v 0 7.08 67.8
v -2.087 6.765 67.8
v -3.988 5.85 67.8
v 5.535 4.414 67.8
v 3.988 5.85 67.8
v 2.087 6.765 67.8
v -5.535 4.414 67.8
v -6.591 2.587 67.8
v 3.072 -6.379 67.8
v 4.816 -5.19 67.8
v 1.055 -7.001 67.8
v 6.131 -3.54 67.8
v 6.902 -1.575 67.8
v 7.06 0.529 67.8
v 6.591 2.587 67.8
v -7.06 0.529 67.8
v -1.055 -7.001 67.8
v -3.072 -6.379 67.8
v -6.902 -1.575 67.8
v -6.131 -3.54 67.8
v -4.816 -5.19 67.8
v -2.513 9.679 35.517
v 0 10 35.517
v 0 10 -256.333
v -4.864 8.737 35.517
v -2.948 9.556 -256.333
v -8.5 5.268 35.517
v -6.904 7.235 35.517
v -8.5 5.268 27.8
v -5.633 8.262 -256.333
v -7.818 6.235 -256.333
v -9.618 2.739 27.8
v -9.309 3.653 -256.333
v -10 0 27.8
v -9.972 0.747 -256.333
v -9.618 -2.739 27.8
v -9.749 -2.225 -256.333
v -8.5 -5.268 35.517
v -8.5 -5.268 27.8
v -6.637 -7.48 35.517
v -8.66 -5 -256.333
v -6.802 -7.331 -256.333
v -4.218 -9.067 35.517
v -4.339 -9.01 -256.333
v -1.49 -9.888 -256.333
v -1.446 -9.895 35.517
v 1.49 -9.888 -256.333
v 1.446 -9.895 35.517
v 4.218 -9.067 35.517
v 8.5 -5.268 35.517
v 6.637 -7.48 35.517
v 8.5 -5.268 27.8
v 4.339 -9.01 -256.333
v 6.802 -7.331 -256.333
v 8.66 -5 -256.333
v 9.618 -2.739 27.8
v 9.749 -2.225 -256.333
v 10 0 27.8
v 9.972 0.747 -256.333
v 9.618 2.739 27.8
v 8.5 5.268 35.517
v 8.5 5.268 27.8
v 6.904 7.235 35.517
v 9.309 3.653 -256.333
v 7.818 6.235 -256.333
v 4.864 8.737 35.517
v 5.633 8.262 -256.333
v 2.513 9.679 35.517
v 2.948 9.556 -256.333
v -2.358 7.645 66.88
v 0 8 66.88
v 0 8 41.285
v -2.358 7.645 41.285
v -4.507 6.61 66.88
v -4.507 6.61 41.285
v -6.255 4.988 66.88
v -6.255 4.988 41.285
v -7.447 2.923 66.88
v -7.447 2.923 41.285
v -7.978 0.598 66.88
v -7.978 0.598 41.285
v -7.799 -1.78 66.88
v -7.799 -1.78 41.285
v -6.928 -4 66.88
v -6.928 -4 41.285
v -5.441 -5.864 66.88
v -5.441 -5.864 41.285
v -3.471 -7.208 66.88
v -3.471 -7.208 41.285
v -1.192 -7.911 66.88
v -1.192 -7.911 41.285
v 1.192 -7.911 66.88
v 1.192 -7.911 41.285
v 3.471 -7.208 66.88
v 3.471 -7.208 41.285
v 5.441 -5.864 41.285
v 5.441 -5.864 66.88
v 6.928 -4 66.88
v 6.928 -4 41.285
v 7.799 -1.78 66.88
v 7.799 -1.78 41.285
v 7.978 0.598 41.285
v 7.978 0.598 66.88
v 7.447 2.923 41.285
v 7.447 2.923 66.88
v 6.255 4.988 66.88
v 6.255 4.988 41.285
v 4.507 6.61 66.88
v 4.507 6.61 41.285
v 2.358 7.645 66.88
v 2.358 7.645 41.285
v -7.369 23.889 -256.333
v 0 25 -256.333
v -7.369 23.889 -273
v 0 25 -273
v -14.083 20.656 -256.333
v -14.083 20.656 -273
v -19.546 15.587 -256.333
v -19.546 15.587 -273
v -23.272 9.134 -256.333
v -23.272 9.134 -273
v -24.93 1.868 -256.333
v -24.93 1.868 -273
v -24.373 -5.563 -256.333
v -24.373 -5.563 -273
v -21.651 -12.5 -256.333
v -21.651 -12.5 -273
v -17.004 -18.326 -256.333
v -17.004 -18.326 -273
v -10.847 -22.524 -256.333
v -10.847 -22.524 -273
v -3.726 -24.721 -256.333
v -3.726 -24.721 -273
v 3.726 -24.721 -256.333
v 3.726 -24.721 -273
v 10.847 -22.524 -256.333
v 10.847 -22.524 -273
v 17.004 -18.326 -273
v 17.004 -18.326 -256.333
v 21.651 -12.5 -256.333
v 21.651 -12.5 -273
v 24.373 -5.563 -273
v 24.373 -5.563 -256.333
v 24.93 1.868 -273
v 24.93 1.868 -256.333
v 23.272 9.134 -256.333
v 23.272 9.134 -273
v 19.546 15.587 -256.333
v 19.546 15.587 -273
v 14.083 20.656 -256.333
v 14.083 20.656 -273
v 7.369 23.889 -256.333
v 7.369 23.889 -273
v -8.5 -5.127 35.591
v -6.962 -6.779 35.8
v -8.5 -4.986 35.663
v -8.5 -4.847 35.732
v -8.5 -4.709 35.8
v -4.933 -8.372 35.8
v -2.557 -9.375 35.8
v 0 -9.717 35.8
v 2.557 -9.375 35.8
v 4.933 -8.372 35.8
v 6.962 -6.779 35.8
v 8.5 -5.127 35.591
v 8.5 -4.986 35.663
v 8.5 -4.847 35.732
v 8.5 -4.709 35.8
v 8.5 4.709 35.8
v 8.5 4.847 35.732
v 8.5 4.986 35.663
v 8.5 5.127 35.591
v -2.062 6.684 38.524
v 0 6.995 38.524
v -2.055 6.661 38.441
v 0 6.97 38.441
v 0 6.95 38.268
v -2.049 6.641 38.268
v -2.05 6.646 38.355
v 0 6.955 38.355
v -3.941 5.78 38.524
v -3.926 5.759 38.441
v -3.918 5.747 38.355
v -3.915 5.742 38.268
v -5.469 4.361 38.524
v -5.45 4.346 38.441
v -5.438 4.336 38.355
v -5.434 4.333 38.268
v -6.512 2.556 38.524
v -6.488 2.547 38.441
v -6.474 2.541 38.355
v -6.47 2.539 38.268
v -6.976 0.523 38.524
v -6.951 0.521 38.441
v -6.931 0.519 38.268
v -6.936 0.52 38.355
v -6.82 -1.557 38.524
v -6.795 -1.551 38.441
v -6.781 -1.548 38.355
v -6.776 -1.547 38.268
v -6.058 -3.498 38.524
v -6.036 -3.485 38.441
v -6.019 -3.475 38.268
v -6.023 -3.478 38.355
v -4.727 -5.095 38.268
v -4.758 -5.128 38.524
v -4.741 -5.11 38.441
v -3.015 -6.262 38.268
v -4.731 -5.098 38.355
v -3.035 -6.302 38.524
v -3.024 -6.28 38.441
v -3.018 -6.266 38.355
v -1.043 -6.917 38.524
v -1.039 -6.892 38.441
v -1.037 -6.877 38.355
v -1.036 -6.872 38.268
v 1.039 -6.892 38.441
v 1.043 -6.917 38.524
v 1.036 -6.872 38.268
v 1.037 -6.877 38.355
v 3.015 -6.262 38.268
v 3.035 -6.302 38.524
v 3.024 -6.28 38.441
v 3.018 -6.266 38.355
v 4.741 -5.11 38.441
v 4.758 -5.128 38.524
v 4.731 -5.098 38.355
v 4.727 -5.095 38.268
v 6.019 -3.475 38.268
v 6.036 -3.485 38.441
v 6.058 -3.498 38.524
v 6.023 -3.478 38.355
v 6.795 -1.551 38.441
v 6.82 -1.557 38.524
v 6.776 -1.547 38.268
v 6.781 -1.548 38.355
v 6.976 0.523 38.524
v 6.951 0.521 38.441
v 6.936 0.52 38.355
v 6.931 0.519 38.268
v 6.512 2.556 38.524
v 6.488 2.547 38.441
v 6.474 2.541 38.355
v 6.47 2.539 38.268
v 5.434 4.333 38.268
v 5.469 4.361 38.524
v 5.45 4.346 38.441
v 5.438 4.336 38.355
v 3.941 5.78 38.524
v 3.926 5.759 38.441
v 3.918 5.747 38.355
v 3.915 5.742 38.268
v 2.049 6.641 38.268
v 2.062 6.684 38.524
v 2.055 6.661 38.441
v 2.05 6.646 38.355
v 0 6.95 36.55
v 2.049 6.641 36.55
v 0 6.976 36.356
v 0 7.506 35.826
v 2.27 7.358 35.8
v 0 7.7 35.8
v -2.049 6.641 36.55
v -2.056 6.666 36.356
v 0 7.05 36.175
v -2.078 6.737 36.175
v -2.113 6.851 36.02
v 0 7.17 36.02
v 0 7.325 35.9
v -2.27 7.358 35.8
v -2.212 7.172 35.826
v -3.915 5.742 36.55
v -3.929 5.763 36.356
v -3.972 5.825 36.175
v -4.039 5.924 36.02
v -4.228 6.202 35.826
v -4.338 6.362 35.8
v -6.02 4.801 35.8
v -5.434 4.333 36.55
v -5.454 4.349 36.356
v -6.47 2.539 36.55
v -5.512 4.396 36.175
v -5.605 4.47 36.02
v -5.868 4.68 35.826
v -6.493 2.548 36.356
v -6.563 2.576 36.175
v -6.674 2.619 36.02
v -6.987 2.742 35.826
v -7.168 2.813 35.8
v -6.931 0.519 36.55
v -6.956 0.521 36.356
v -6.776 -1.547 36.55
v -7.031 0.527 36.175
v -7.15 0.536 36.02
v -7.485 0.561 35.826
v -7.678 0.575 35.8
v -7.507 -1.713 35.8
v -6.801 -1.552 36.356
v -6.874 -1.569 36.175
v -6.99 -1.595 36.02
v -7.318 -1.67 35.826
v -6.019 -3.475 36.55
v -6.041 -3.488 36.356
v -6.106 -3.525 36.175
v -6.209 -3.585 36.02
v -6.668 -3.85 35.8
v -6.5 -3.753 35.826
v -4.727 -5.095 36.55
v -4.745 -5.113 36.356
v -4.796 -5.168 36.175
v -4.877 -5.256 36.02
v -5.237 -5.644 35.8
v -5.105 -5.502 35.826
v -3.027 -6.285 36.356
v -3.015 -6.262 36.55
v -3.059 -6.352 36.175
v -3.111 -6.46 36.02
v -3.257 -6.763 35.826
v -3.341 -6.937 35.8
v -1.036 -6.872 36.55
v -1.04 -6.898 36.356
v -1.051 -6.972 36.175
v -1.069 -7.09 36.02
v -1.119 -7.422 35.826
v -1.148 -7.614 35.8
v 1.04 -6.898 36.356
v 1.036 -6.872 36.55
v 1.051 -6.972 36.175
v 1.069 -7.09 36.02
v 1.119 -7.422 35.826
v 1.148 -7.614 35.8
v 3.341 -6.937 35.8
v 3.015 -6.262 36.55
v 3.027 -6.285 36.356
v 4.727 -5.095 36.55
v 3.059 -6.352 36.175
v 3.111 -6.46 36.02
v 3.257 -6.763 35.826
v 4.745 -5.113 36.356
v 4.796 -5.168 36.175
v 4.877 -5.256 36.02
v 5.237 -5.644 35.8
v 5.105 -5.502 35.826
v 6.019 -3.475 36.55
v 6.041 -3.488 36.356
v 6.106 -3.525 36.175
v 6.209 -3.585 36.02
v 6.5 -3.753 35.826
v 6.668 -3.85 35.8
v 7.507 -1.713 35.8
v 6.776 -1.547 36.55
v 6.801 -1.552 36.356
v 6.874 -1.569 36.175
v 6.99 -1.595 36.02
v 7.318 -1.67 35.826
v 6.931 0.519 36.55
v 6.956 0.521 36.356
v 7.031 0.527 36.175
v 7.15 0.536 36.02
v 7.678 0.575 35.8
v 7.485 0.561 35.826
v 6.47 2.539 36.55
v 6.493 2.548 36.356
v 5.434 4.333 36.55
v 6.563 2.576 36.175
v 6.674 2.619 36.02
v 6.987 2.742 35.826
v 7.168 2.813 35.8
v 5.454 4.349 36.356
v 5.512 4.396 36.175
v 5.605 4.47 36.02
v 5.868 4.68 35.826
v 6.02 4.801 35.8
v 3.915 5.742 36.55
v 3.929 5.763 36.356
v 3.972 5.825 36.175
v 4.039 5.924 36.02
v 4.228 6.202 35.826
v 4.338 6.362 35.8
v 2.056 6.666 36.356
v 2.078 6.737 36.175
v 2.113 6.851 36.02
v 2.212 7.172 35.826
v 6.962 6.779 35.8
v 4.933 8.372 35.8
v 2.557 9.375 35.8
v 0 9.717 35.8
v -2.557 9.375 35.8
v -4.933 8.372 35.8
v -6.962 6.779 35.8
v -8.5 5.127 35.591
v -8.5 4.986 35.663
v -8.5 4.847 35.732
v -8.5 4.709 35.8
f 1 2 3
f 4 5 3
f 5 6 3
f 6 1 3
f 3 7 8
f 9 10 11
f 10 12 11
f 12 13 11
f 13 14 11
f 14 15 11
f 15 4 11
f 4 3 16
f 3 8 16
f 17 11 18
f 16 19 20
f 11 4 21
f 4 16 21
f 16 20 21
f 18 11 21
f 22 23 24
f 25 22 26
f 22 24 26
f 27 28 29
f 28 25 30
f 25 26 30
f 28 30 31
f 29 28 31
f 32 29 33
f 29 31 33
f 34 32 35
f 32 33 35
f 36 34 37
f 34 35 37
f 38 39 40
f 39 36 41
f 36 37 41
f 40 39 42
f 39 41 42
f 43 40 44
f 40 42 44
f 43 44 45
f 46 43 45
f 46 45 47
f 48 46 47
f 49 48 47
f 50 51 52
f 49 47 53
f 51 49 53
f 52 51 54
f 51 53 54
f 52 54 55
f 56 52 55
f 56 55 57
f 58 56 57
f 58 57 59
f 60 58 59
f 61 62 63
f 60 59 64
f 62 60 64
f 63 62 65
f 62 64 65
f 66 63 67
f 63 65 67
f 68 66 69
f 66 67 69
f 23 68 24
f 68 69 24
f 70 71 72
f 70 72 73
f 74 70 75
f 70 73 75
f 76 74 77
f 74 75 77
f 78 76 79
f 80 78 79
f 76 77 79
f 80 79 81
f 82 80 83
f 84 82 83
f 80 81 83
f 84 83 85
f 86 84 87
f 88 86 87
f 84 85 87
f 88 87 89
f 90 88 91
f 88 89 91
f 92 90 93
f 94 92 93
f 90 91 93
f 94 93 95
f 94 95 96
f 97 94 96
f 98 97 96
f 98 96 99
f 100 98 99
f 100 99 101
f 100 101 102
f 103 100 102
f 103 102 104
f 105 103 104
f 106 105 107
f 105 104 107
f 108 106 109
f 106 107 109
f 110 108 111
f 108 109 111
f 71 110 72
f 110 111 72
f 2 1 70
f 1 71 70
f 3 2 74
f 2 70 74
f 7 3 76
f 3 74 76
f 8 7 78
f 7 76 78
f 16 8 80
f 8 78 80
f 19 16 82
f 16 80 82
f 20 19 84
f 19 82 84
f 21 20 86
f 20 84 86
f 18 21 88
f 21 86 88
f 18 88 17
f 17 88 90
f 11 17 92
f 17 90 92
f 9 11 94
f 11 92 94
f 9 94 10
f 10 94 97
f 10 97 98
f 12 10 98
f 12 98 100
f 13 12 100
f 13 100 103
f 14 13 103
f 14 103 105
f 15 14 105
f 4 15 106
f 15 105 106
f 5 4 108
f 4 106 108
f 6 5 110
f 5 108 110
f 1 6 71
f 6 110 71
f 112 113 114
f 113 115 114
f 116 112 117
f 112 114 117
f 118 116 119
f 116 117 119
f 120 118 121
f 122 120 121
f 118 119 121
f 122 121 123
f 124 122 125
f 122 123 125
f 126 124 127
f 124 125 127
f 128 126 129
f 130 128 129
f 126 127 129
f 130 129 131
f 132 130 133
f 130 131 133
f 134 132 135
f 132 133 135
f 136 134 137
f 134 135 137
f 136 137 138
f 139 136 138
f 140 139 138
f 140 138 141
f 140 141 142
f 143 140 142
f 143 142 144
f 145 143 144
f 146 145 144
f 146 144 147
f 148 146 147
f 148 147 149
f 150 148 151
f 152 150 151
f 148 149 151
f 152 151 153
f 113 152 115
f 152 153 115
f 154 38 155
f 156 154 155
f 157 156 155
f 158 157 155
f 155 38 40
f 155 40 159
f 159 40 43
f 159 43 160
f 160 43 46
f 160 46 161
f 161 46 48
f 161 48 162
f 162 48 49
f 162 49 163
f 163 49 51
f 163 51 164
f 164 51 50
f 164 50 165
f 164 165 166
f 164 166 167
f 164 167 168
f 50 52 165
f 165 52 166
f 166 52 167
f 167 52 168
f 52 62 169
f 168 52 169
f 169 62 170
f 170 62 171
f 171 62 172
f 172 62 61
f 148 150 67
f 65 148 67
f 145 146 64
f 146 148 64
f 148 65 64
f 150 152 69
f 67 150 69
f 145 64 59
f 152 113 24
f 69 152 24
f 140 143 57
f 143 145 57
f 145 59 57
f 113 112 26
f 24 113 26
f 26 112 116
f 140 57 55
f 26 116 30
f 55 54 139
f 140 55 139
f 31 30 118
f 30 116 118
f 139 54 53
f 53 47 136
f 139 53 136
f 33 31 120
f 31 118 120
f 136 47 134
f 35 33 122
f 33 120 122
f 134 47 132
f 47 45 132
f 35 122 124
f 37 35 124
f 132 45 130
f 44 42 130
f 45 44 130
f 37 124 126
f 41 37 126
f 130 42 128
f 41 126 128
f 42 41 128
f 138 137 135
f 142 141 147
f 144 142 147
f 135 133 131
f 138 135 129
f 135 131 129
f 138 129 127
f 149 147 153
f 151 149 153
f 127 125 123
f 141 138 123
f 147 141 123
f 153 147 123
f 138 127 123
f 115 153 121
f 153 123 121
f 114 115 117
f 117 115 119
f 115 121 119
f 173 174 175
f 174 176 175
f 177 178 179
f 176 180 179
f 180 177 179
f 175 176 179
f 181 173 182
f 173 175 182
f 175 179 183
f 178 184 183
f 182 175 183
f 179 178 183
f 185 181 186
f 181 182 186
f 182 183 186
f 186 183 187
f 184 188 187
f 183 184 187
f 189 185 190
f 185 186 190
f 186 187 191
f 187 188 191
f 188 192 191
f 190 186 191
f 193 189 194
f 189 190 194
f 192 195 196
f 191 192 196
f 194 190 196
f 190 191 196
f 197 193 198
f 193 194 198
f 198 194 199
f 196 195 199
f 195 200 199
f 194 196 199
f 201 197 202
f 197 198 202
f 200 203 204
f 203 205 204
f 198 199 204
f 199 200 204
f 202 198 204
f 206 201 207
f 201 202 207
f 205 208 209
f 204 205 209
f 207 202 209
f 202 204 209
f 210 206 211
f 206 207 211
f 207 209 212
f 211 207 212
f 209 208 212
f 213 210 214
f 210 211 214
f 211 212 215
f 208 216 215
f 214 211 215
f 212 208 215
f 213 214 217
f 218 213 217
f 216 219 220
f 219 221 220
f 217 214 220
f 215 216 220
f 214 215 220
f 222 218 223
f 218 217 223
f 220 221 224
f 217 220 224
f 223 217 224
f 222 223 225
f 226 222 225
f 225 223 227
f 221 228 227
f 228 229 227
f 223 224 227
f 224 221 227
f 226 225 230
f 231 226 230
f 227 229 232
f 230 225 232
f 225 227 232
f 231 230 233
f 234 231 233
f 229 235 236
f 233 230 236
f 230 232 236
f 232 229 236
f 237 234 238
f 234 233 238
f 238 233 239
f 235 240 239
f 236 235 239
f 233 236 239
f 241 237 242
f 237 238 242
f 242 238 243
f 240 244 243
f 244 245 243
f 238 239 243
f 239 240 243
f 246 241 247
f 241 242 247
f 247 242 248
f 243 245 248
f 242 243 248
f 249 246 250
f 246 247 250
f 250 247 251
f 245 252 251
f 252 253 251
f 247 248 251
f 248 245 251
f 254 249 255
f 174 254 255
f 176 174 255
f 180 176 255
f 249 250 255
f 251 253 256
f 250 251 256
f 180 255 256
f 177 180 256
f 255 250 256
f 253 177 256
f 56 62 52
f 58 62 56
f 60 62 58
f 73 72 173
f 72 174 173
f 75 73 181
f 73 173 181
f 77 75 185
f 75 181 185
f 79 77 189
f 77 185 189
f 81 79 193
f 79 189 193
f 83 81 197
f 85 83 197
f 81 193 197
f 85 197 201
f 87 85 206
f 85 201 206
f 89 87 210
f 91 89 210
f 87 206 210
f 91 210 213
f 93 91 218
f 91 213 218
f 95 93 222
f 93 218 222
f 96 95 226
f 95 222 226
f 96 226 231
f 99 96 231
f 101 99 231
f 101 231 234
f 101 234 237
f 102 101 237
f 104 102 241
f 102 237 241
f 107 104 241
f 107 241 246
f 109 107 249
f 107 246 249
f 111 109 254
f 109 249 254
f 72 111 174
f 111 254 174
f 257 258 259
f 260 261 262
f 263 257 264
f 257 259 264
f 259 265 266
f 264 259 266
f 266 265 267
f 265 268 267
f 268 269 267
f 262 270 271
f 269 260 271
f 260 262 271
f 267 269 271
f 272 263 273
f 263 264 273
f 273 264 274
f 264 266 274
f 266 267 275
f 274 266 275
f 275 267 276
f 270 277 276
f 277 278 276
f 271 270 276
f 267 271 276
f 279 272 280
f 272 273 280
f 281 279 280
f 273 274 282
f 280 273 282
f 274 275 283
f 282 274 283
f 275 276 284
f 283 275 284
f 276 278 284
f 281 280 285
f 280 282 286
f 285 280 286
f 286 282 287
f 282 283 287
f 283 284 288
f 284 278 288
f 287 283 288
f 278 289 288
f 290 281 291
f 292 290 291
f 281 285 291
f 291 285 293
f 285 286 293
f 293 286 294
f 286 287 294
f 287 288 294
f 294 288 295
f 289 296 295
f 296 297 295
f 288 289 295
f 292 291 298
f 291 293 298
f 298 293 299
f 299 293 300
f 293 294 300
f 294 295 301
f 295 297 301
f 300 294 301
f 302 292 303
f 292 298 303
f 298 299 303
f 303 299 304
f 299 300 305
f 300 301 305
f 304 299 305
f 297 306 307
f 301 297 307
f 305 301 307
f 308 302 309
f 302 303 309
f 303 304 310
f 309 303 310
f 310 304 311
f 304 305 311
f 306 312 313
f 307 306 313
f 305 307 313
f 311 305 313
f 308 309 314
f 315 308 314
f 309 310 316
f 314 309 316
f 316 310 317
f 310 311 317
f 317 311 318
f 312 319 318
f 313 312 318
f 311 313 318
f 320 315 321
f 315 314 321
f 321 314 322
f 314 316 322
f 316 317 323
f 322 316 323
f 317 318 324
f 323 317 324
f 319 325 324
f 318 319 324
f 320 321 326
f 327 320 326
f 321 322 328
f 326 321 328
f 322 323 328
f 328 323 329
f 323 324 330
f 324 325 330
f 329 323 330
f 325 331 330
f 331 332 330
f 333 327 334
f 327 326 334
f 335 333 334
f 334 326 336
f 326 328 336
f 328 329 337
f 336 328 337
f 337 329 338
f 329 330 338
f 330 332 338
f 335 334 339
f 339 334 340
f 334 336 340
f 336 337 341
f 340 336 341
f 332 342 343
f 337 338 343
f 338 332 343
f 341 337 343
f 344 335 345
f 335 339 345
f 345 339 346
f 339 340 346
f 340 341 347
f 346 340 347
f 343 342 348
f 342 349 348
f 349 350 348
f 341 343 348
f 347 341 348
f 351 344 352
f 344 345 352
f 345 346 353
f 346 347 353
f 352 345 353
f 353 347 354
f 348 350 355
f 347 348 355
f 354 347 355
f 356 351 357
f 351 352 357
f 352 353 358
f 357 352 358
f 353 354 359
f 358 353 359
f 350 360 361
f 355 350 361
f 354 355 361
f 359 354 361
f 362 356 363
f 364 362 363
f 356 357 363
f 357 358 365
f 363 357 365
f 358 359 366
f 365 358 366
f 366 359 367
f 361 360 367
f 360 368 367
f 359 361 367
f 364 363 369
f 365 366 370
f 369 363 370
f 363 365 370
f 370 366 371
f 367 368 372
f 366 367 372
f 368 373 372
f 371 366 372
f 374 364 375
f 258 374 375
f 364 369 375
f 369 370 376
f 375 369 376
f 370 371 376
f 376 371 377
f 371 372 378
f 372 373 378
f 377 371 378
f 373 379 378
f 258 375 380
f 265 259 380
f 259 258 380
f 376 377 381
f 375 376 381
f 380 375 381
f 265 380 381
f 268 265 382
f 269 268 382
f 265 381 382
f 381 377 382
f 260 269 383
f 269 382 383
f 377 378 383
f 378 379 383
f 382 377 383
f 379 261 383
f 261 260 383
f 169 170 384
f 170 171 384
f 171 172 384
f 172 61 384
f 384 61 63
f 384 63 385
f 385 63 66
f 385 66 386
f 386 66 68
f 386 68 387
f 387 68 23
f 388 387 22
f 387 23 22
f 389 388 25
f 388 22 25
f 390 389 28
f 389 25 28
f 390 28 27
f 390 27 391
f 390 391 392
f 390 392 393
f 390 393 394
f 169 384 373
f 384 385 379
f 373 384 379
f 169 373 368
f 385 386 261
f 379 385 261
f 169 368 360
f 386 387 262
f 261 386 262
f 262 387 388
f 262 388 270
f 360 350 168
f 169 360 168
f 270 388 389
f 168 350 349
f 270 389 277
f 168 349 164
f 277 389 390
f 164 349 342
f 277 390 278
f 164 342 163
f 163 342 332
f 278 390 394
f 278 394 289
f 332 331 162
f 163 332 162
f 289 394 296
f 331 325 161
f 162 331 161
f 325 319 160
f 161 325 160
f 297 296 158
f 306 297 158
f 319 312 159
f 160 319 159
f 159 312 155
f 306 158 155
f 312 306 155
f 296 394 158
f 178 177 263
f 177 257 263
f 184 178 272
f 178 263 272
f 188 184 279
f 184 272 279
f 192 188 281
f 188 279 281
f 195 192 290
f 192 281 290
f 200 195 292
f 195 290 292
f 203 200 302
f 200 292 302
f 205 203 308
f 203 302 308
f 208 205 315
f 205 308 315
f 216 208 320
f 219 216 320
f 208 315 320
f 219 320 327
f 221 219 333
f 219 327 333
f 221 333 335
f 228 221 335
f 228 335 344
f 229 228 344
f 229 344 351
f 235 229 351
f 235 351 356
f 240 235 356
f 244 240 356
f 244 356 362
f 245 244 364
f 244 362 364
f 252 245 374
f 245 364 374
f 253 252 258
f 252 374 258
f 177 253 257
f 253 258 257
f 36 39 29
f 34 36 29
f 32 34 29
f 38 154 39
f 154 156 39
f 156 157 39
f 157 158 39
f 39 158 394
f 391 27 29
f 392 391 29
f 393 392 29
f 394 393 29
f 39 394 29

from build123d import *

# Parameters (mm, degrees)
CUT_EXTRUDE1_DEPTH      = 17
CUT_EXTRUDE1_DEPTH_BACK = 17


with BuildPart() as part:
    # Sketch1 → Revolve1 (revolve)
    with BuildSketch(Plane(origin=(0, 0, 0), x_dir=(0, 0, -1), z_dir=(1, 0, 0))):
        Polygon((-35.8, 0), (-35.8, 9.717157288), (-35.517157288, 10), (256.333333333, 10), (256.333333333, 25), (273, 25), (273, 0), align=None)
    revolve(axis=Axis((0, 0, -273), (0, 0, 1)))

    # Sketch2 → Cut-Extrude1 (cut, two sides: drawn at the far end of the back side and taken through both)
    with BuildSketch(Plane(origin=(0, 0, 0), x_dir=(1, 0, 0), z_dir=(0, 1, 0)).offset(-CUT_EXTRUDE1_DEPTH_BACK)):
        Polygon((-17, -61.8), (17, -61.8), (17, -27.8), (8.5, -27.8), (8.5, -43.8), (-8.5, -43.8), (-8.5, -27.8), (-17, -27.8), align=None)
    extrude(amount=CUT_EXTRUDE1_DEPTH + CUT_EXTRUDE1_DEPTH_BACK, mode=Mode.SUBTRACT)

    # Sketch3 → Revolve2 (revolve)
    with BuildSketch(Plane(origin=(0, 0, 0), x_dir=(0, 0, -1), z_dir=(1, 0, 0))):
        with BuildLine():
            Line((-67.8, 0), (-67.8, 7.08))
            Line((-67.8, 7.08), (-66.88, 8))
            Line((-66.88, 8), (-41.28485129, 8))
            Line((-41.28485129, 8), (-38.524269872, 6.995230534))
            ThreePointArc((-38.524269872, 6.995230534), (-38.397990898, 6.961394185), (-38.267754764, 6.95))
            Line((-38.267754764, 6.95), (-36.55, 6.95))
            ThreePointArc((-36.55, 6.95), (-36.019669914, 7.169669914), (-35.8, 7.7))
            Line((-35.8, 7.7), (-35.05, 7.7))
            Line((-35.05, 7.7), (-35.05, 0))
            Line((-35.05, 0), (-67.8, 0))
        make_face()
    revolve(axis=Axis((0, 0, 35.05), (0, 0, 1)))


solid = part.part
